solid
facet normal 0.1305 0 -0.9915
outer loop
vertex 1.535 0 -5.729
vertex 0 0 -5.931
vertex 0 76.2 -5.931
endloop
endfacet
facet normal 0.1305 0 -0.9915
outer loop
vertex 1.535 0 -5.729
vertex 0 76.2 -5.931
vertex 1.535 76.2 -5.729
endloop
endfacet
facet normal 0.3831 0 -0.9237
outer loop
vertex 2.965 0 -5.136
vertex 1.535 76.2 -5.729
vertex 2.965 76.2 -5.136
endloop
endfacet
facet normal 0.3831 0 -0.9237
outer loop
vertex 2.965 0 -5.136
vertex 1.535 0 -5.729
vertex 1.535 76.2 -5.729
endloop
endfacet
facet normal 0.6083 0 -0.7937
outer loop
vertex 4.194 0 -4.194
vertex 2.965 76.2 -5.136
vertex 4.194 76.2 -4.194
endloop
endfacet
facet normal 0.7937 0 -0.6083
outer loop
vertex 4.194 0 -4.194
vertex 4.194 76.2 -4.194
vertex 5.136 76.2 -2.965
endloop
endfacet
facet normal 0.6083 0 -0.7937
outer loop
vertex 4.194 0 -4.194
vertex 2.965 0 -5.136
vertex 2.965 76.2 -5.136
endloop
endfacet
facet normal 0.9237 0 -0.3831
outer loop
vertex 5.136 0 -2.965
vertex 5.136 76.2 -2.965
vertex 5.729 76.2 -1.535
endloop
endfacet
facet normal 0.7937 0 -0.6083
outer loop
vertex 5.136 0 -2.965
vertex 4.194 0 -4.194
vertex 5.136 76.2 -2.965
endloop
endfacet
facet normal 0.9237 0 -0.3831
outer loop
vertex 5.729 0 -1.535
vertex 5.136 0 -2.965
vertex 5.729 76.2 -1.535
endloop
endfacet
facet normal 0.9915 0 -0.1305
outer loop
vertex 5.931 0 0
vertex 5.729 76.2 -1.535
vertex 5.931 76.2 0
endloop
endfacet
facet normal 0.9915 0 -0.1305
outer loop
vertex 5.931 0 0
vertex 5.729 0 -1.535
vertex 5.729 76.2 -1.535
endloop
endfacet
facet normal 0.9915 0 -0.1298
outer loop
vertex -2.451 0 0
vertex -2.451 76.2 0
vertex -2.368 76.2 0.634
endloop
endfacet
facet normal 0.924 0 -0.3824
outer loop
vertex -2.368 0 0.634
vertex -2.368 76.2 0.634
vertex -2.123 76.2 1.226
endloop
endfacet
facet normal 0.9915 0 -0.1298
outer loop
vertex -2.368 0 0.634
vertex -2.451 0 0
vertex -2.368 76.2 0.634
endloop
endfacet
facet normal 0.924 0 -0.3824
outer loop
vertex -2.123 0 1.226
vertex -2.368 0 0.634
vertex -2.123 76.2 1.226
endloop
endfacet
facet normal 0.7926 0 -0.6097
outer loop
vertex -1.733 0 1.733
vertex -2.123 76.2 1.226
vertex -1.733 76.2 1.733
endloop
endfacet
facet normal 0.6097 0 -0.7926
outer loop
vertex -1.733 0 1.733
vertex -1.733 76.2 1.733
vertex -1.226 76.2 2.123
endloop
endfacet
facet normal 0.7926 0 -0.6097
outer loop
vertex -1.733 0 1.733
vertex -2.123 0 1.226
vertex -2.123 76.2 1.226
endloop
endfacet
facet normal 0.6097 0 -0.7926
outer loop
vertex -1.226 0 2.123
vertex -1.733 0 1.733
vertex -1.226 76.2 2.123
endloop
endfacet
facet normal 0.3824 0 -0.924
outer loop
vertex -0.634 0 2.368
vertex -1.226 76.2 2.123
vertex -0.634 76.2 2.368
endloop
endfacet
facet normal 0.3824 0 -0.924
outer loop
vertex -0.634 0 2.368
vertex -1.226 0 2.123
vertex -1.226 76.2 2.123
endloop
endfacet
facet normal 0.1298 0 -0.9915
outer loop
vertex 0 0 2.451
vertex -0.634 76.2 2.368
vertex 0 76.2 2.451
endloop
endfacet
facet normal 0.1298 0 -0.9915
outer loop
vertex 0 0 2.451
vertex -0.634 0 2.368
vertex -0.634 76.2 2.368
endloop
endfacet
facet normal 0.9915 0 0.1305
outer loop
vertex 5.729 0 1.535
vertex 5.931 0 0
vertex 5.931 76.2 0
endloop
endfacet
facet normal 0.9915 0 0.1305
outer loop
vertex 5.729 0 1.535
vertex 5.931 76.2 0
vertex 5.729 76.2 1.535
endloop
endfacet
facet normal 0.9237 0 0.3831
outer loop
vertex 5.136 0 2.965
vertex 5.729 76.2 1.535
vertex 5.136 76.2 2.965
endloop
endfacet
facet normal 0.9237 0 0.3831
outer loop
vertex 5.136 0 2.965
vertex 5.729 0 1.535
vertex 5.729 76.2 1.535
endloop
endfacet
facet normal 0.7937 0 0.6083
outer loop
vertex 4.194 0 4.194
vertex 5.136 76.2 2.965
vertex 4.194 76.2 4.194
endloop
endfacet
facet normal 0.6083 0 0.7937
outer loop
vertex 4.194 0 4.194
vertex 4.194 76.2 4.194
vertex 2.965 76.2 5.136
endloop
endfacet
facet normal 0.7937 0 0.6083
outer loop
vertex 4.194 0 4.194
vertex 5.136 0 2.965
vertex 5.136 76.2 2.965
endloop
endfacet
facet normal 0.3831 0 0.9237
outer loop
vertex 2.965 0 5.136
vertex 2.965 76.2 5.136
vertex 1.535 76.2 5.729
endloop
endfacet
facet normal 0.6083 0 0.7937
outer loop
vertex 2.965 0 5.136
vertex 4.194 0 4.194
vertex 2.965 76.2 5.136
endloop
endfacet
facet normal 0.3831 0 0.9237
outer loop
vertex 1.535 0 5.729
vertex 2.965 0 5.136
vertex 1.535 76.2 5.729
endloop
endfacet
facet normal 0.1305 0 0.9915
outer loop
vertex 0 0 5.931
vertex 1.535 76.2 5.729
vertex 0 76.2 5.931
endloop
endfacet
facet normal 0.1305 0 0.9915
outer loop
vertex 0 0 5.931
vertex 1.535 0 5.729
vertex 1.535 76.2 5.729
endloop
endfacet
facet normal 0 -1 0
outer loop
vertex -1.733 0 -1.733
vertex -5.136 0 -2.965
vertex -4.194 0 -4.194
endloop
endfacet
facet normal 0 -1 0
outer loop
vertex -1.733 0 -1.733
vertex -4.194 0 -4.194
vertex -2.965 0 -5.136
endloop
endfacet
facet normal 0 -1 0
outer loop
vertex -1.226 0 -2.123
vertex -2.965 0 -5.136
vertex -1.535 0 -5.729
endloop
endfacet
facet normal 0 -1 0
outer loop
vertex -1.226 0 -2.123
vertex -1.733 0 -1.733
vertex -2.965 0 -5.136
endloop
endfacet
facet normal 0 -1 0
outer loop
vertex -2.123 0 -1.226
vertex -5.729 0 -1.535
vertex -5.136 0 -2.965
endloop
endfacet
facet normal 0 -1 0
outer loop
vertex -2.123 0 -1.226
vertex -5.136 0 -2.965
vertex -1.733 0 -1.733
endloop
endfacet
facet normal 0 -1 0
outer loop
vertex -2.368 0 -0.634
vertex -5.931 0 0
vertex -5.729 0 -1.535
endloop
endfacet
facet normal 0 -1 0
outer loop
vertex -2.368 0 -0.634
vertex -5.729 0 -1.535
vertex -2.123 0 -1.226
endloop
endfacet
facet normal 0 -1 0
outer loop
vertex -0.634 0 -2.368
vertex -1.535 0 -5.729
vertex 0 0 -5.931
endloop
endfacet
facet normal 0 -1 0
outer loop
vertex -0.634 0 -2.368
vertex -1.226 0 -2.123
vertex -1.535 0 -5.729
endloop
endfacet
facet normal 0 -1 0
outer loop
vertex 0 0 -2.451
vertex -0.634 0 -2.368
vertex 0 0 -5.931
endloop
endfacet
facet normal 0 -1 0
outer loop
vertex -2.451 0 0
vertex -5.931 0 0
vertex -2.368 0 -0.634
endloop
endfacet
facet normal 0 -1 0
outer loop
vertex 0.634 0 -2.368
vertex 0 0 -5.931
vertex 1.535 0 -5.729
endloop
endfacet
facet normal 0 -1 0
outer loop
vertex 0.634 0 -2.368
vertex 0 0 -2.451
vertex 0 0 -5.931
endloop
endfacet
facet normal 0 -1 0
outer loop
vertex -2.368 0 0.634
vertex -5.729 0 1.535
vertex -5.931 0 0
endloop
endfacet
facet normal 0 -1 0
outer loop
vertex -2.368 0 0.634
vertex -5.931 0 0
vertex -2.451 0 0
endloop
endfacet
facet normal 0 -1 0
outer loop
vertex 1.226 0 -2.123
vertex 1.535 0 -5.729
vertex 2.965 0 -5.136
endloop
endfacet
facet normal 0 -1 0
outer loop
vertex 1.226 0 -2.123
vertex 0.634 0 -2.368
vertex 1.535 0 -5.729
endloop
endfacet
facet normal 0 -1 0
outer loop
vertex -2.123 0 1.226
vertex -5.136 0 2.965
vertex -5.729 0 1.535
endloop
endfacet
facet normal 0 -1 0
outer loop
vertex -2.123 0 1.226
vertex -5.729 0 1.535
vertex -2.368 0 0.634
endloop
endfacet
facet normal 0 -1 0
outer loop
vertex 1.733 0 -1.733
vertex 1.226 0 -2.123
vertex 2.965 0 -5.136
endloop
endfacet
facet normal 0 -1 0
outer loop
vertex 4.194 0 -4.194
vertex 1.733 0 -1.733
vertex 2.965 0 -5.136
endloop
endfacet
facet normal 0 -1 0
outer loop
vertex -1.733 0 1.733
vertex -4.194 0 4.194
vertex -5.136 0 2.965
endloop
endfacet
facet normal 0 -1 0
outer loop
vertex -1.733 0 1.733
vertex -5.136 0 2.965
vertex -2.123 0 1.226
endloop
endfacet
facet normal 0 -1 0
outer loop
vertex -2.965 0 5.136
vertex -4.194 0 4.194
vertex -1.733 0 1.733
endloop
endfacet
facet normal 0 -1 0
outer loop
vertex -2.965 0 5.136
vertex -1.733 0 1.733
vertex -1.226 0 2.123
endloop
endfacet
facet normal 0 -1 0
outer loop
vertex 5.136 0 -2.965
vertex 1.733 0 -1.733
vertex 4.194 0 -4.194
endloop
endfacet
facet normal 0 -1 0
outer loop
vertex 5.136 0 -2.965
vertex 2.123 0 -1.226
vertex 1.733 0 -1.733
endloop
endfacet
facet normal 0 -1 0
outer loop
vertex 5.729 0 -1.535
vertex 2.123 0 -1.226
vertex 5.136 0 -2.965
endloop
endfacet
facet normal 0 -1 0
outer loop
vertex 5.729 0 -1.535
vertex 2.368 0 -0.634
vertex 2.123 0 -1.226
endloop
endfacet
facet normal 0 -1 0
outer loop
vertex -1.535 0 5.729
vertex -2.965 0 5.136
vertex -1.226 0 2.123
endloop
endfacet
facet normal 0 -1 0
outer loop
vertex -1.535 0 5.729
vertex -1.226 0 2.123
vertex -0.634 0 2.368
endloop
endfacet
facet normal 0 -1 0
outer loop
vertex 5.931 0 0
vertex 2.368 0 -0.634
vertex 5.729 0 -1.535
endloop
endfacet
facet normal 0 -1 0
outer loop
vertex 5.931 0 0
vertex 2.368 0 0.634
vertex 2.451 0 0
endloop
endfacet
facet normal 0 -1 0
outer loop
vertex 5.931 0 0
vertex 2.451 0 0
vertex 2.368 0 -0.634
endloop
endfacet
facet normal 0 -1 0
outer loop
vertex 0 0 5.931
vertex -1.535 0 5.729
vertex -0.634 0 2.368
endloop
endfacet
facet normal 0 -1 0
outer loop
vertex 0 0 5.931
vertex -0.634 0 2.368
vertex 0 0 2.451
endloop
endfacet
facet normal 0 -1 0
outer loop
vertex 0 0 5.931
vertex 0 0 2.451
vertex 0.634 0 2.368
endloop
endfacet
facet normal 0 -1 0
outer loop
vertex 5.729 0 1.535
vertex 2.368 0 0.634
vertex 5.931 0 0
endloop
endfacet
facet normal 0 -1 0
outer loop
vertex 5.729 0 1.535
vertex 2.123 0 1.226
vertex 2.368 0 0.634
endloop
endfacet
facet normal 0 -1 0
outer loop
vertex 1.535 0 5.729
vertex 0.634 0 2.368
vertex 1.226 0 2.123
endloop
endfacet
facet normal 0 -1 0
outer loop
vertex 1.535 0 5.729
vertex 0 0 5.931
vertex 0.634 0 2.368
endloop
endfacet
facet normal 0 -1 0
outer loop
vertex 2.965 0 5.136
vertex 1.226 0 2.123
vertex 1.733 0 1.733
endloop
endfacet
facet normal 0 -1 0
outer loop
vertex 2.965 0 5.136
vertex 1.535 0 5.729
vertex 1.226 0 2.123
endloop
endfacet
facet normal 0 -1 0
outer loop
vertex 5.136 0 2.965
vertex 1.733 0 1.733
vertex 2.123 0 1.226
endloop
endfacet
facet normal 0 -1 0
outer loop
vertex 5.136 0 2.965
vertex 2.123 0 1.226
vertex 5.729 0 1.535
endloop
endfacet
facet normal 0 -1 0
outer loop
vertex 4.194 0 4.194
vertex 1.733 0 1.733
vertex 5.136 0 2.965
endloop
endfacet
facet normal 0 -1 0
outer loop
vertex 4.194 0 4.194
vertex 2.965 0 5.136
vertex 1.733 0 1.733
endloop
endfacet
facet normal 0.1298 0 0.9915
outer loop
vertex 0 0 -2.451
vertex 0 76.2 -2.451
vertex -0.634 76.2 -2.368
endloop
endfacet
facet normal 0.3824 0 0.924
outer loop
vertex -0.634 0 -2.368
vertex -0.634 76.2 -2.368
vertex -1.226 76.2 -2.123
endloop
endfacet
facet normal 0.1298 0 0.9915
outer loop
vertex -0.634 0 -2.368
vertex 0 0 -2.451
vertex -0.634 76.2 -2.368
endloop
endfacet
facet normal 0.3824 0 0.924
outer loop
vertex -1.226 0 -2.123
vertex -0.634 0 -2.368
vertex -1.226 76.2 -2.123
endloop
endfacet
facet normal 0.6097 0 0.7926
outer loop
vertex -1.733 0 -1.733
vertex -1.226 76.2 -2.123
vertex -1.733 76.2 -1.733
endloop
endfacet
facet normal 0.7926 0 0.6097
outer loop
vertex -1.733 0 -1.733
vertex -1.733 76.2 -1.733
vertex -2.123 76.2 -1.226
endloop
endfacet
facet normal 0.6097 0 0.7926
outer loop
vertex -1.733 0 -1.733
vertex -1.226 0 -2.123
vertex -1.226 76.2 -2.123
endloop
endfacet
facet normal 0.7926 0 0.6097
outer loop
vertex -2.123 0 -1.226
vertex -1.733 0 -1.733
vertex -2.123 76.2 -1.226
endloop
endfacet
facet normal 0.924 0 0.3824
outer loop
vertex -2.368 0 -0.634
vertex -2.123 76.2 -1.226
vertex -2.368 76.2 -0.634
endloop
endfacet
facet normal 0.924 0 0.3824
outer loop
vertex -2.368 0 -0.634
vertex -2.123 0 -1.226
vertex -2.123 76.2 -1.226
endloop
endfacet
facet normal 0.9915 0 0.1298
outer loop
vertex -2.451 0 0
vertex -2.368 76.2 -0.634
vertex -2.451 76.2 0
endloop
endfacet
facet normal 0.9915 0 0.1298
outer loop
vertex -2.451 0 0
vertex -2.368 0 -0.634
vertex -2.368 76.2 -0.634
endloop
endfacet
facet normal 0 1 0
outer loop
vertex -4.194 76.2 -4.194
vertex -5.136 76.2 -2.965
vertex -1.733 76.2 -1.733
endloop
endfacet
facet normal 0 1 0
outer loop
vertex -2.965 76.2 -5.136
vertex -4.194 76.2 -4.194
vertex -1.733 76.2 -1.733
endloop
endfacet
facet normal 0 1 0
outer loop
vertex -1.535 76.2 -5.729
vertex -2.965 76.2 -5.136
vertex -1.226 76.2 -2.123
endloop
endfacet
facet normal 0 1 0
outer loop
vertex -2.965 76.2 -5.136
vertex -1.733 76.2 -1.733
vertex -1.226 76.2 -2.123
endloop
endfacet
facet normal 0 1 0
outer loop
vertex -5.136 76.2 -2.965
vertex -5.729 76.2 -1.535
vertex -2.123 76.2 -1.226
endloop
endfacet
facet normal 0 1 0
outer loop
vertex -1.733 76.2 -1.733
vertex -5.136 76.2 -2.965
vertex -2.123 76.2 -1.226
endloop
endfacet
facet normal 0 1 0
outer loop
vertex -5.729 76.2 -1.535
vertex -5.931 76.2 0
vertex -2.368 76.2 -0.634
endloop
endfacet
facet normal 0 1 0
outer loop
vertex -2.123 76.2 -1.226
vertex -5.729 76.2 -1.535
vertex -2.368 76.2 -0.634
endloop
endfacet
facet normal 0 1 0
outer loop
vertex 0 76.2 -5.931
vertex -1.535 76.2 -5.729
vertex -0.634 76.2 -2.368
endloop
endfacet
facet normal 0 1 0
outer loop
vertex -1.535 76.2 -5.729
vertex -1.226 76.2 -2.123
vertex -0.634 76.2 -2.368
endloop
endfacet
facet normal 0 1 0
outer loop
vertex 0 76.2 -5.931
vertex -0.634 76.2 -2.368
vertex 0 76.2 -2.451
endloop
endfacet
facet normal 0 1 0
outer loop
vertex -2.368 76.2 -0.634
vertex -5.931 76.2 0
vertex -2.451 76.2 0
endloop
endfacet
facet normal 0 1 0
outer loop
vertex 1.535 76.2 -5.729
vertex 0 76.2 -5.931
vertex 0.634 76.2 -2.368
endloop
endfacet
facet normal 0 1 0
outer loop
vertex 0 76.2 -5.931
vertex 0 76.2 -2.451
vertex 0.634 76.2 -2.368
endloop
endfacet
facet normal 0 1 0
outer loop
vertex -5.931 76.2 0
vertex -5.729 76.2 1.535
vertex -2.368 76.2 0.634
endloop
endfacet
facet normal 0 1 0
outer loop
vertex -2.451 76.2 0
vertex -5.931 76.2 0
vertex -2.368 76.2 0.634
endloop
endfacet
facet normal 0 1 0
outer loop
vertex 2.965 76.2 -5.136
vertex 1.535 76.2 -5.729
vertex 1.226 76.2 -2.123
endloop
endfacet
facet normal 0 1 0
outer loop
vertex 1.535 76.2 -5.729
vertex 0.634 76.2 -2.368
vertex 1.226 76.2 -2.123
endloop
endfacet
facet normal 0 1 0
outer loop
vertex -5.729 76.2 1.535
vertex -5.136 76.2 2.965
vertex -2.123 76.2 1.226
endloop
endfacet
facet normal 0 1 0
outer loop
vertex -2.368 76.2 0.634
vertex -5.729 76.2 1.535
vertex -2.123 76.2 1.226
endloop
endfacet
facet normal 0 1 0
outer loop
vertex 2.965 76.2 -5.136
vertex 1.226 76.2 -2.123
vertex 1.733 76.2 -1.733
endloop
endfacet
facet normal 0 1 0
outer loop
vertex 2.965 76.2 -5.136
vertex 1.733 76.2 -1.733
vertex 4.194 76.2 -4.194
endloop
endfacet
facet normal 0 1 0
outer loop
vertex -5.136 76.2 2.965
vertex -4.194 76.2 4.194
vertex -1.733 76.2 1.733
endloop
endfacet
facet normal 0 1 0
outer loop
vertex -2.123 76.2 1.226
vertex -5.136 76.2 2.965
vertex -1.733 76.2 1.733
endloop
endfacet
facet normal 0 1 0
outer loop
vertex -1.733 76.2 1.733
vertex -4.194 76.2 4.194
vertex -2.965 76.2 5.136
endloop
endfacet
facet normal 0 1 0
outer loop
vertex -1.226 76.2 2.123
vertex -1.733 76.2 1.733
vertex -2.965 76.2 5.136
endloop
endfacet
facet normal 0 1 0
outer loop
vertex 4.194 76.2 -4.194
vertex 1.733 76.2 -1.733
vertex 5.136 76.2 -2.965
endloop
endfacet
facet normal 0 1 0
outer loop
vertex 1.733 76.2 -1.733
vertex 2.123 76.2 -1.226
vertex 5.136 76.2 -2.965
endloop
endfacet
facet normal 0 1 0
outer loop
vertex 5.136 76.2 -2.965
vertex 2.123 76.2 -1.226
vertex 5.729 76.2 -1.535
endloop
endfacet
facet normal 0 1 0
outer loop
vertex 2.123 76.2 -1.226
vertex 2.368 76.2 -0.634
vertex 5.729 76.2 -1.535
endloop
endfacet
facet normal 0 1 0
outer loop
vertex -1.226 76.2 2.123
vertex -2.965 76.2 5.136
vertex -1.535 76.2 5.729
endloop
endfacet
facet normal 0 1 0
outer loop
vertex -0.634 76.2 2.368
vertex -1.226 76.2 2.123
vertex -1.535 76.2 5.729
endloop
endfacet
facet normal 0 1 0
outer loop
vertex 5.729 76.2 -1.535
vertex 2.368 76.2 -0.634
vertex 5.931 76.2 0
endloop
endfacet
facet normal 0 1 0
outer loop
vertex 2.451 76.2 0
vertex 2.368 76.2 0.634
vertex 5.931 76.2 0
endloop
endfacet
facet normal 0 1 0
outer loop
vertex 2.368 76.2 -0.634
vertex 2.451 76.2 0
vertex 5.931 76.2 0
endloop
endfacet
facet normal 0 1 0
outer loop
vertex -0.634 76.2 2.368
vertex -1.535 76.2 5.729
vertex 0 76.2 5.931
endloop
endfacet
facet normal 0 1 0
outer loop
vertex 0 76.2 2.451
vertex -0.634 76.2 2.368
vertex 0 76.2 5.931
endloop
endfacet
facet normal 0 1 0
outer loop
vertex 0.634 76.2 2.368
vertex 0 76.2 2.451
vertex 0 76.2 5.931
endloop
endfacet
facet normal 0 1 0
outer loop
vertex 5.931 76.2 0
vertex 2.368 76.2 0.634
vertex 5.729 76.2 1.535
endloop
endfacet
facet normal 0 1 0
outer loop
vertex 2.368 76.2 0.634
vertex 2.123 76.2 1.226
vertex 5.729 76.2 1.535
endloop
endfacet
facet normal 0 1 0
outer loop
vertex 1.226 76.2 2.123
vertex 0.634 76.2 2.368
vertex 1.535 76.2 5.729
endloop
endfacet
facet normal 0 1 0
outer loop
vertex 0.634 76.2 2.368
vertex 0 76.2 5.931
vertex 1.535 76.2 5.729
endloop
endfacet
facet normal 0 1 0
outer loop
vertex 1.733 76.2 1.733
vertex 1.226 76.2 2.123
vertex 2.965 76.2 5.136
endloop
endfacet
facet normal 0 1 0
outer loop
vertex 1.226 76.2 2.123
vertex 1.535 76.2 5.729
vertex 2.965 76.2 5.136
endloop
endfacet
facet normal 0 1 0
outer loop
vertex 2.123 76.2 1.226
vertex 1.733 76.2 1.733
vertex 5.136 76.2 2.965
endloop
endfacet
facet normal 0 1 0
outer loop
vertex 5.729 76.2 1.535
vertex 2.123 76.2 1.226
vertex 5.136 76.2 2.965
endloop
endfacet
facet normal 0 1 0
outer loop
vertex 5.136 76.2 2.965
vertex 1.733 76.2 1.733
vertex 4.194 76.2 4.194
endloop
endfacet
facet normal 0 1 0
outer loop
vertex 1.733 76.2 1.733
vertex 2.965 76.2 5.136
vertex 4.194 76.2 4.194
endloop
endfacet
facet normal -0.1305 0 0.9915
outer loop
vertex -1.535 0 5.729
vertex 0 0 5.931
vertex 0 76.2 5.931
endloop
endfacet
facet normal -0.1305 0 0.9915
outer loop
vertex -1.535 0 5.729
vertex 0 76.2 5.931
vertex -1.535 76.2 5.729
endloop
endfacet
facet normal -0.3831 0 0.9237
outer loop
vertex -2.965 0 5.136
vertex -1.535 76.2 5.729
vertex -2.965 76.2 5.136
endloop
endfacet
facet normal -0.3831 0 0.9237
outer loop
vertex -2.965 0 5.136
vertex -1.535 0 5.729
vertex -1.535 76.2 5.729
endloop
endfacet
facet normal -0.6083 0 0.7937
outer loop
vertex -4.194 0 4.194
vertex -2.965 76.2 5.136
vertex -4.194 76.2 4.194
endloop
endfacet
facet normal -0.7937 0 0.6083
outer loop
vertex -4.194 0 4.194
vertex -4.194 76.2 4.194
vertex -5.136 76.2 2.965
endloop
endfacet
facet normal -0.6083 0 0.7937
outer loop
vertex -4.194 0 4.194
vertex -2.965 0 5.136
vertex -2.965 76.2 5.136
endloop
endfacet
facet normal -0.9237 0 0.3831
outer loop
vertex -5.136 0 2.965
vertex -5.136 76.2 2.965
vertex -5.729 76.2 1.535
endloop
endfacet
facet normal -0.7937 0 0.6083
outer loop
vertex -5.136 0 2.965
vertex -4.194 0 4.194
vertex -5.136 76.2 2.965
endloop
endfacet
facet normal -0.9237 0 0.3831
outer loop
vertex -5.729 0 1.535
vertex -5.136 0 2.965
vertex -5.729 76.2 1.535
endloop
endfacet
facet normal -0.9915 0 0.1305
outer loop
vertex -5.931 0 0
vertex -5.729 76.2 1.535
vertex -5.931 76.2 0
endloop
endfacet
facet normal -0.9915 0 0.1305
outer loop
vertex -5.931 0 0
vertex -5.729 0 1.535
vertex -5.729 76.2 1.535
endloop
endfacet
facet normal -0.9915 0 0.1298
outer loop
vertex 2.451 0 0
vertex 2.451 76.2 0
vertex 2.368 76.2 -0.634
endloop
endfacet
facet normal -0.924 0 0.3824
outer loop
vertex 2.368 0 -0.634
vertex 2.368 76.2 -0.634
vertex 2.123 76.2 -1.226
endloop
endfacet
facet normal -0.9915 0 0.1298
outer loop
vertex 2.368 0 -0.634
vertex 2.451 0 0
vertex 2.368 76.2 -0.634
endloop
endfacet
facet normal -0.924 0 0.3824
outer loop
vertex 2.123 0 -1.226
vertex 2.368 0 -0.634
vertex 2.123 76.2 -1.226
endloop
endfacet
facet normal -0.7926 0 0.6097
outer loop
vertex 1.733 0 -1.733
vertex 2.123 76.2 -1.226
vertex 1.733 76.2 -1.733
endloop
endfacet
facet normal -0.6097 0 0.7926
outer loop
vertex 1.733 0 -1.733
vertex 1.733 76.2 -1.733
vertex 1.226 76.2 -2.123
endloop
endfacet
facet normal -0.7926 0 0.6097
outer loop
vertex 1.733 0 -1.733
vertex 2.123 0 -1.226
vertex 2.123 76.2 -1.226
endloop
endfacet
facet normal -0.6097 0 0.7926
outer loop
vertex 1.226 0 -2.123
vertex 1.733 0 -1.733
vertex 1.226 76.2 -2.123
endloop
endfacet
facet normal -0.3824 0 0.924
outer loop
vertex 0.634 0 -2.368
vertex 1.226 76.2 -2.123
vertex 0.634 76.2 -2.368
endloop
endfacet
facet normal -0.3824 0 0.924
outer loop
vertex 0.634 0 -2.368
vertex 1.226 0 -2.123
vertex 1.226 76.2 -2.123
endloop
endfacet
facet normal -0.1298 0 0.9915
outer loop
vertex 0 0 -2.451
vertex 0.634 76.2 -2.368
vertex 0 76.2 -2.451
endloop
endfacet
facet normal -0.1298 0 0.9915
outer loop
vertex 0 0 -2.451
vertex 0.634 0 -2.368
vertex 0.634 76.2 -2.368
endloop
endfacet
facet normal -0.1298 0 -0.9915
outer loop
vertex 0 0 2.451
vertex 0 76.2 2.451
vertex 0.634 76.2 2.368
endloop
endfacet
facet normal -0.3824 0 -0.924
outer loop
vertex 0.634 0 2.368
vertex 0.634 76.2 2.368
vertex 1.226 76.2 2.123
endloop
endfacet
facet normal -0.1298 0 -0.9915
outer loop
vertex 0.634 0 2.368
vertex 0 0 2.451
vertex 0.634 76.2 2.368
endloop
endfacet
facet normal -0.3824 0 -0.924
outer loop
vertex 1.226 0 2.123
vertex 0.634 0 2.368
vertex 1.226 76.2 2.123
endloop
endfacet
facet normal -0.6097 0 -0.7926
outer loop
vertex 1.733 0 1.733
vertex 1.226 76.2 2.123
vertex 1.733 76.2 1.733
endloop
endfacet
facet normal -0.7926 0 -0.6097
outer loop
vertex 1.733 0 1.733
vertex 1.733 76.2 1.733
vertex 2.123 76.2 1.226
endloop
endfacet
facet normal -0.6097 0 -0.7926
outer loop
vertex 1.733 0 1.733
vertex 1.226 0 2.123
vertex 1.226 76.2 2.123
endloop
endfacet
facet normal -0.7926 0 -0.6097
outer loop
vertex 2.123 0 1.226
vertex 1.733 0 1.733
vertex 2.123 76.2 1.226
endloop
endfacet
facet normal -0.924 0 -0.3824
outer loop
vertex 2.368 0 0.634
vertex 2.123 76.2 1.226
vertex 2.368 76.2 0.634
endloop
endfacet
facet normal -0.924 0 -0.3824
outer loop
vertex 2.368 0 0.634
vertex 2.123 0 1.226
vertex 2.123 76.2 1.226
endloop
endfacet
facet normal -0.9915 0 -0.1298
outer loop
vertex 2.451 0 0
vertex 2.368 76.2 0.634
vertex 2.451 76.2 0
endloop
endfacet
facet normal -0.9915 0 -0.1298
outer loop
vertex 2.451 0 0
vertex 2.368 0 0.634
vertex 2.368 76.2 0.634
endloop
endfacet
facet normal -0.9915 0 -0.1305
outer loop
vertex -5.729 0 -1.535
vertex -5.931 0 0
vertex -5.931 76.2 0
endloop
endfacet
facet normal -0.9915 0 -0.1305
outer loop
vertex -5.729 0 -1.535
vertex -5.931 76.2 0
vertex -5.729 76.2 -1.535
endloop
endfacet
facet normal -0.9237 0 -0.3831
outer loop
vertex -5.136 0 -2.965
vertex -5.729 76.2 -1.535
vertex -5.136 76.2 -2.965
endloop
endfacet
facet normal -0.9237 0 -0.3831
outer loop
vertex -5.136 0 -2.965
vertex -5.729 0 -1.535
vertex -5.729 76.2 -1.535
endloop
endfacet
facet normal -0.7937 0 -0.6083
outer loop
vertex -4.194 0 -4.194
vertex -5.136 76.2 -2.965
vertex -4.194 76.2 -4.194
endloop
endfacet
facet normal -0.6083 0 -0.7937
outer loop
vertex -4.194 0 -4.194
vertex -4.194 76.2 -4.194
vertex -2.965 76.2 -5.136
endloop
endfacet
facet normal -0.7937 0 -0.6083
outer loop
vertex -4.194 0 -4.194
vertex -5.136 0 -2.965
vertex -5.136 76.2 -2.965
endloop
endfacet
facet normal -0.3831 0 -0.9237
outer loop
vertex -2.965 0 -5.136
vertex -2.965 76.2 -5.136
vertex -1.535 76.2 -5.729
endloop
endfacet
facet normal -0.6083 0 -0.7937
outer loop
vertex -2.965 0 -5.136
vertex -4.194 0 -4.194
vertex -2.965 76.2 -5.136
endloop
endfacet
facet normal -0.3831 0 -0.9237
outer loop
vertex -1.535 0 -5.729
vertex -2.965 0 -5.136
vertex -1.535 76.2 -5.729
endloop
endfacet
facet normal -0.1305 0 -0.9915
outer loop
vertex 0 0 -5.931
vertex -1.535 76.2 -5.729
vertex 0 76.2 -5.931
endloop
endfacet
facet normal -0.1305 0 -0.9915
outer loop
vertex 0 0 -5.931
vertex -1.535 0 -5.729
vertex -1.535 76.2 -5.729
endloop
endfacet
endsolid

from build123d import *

# Parameters (mm, degrees)
F1_DEPTH = 76.2


with BuildPart() as f1:
    # F0 (on Front) → F1 (new body)
    with BuildSketch(Plane.XZ):
        with BuildLine():
            ThreePointArc((-2.451287, 0), (-1.733322, 1.733322), (0, 2.451287))
            Line((0, 2.451287), (0, 5.930875))
            ThreePointArc((0, 5.930875), (-4.193762, 4.193762), (-5.930875, 0))
            Line((-5.930875, 0), (-2.451287, 0))
        make_face()
        with BuildLine():
            ThreePointArc((0, 2.451287), (1.733322, 1.733322), (2.451287, 0))
            Line((2.451287, 0), (5.930875, 0))
            ThreePointArc((5.930875, 0), (4.193762, 4.193762), (0, 5.930875))
            Line((0, 5.930875), (0, 2.451287))
        make_face()
        with BuildLine():
            Line((0, -5.930875), (0, -2.451287))
            ThreePointArc((0, -2.451287), (-1.733322, -1.733322), (-2.451287, 0))
            Line((-2.451287, 0), (-5.930875, 0))
            ThreePointArc((-5.930875, 0), (-4.193762, -4.193762), (0, -5.930875))
        make_face()
        with BuildLine():
            Line((5.930875, 0), (2.451287, 0))
            ThreePointArc((2.451287, 0), (1.733322, -1.733322), (0, -2.451287))
            Line((0, -2.451287), (0, -5.930875))
            ThreePointArc((0, -5.930875), (4.193762, -4.193762), (5.930875, 0))
        make_face()
    extrude(amount=-F1_DEPTH)


solid = f1.part
